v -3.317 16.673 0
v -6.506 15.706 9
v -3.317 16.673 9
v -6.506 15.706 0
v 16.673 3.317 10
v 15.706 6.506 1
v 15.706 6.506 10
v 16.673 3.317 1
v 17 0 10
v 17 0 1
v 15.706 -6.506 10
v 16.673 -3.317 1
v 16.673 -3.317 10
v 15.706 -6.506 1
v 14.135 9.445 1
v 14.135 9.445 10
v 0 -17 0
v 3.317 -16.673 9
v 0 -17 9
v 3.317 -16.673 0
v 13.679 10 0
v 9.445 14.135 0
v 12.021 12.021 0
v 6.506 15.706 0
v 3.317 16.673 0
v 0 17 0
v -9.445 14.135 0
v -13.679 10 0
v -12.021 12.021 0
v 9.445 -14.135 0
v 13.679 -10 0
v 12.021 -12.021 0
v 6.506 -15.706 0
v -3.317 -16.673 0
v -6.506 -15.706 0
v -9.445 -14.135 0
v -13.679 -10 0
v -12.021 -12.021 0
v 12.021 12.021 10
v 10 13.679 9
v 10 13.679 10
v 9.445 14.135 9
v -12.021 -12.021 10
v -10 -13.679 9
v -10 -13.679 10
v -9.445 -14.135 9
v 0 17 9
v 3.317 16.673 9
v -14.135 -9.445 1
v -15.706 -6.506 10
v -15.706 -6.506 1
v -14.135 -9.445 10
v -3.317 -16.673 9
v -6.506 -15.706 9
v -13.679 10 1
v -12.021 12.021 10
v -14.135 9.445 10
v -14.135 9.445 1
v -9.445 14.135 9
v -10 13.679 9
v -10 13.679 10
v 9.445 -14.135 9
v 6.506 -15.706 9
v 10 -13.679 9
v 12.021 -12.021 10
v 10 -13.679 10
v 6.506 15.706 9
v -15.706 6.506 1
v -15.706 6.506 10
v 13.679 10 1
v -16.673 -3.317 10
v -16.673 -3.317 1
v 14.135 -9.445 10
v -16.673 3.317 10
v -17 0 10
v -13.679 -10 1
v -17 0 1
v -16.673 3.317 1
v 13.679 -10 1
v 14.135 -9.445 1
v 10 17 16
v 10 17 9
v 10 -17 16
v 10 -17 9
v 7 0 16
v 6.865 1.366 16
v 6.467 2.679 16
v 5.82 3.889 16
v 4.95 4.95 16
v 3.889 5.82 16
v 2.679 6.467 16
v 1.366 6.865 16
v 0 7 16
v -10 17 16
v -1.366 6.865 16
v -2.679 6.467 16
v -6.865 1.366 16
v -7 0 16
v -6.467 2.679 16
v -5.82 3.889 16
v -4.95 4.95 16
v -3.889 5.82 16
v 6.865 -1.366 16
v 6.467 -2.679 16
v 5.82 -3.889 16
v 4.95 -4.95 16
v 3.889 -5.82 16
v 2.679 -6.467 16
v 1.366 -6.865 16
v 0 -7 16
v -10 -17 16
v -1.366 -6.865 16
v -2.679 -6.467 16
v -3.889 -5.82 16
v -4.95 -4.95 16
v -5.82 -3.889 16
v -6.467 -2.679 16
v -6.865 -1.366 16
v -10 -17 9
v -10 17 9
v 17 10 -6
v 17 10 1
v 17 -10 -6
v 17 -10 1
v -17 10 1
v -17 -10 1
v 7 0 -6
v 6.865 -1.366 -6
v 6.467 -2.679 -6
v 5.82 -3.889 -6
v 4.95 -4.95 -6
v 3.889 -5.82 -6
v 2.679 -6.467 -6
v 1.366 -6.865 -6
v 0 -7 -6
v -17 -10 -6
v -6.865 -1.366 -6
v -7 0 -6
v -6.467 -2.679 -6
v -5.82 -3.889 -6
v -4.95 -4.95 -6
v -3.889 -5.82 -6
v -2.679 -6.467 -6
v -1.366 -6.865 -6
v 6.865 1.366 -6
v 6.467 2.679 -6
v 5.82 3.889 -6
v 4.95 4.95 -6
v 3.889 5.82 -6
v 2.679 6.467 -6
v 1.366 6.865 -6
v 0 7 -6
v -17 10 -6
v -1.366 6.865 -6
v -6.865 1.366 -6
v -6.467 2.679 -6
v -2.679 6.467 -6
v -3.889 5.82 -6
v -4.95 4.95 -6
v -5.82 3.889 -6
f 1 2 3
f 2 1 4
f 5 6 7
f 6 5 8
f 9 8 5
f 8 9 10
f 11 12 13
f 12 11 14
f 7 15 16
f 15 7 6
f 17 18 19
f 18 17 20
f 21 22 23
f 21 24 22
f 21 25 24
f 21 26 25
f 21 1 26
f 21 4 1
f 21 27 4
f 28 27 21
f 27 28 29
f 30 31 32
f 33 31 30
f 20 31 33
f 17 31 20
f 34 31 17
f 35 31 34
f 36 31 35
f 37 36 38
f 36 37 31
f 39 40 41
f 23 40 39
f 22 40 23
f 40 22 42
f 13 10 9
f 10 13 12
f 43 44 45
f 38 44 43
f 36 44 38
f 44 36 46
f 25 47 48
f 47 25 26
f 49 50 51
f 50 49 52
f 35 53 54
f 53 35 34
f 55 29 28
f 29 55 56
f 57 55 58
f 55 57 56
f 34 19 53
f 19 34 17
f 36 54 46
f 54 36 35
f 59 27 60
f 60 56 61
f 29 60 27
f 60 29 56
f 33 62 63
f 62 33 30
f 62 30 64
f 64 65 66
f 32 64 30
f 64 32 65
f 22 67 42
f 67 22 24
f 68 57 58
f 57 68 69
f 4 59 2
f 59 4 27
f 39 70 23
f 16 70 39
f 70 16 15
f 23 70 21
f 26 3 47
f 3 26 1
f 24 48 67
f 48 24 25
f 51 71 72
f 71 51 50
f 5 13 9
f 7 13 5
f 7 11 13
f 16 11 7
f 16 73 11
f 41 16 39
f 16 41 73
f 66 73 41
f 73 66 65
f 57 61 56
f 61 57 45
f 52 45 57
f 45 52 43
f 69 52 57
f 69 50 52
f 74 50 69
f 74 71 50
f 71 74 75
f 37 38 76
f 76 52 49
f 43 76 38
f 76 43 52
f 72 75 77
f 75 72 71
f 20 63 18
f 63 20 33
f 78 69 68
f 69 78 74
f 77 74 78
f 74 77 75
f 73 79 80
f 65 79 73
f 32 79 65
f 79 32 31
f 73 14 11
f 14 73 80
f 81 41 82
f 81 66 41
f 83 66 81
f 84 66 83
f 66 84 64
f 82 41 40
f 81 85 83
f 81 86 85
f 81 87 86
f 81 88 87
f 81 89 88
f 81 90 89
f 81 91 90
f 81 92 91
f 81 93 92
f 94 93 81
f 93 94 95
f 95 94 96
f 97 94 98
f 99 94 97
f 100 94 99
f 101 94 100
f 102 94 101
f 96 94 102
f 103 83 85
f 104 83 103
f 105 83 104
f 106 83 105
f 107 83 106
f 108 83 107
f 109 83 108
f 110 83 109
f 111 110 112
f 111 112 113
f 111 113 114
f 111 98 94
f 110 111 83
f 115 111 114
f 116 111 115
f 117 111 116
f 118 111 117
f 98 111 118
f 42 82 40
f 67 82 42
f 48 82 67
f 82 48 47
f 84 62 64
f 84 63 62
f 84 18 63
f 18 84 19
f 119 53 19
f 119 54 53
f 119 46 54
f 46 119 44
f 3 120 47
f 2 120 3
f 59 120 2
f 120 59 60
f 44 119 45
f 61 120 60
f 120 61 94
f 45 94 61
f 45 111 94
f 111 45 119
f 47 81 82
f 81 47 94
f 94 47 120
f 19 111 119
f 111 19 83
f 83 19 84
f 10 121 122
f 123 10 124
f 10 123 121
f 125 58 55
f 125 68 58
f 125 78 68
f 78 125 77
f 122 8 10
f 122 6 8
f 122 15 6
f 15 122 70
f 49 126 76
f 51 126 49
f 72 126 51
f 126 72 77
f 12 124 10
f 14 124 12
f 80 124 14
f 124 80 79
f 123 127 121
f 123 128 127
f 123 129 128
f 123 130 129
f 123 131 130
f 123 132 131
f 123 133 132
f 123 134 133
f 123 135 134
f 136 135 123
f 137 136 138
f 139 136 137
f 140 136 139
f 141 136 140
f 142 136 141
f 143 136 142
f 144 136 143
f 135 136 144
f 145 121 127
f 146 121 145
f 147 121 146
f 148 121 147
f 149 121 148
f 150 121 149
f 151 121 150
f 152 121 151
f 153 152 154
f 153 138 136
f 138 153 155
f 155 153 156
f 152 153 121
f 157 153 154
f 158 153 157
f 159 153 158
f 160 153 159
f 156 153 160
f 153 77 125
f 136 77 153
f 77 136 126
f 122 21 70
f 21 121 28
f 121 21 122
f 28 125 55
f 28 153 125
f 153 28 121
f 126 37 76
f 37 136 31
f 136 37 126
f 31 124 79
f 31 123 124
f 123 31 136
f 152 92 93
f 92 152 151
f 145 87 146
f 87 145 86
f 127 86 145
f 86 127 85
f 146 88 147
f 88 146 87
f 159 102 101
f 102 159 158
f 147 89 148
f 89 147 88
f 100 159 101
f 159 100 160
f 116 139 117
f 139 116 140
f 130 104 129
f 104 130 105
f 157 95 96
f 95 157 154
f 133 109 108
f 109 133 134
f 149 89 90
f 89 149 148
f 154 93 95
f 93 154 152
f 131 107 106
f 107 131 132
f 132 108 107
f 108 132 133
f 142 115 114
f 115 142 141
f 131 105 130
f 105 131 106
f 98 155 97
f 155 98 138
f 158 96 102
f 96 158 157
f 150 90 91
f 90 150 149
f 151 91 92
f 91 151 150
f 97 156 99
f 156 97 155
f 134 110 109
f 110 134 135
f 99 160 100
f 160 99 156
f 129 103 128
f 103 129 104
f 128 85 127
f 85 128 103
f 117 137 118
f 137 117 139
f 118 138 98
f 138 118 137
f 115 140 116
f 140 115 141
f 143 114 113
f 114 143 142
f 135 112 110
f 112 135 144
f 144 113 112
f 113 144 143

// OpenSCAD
$fn = 32;

// ----------------------------------------------------------------------
// Oldham coupling disc: 34 x 22 mm
// ----------------------------------------------------------------------

// --- parameters (mm) ---
disc_d = 34;              // disc diameter
disc_t = 10;              // disc thickness
tongue_w = 20;            // tongue width
tongue_h = 6;             // tongue height
bore_d = 14;              // centre lightening bore

module disc() {
  cylinder(h = disc_t, d = disc_d);
  /* tongue on the top face, sunk 1 mm into the disc */
  translate([-tongue_w / 2, -disc_d / 2, disc_t - 1]) cube([tongue_w, disc_d, tongue_h + 1]);
  /* slot wall on the bottom face, 90 degrees turned */
  translate([-disc_d / 2, -tongue_w / 2, -tongue_h]) cube([disc_d, tongue_w, tongue_h + 1]);
}

difference() {
  disc();
  translate([0, 0, -tongue_h - 1]) cylinder(h = disc_t + 2 * tongue_h + 2, d = bore_d);
}
